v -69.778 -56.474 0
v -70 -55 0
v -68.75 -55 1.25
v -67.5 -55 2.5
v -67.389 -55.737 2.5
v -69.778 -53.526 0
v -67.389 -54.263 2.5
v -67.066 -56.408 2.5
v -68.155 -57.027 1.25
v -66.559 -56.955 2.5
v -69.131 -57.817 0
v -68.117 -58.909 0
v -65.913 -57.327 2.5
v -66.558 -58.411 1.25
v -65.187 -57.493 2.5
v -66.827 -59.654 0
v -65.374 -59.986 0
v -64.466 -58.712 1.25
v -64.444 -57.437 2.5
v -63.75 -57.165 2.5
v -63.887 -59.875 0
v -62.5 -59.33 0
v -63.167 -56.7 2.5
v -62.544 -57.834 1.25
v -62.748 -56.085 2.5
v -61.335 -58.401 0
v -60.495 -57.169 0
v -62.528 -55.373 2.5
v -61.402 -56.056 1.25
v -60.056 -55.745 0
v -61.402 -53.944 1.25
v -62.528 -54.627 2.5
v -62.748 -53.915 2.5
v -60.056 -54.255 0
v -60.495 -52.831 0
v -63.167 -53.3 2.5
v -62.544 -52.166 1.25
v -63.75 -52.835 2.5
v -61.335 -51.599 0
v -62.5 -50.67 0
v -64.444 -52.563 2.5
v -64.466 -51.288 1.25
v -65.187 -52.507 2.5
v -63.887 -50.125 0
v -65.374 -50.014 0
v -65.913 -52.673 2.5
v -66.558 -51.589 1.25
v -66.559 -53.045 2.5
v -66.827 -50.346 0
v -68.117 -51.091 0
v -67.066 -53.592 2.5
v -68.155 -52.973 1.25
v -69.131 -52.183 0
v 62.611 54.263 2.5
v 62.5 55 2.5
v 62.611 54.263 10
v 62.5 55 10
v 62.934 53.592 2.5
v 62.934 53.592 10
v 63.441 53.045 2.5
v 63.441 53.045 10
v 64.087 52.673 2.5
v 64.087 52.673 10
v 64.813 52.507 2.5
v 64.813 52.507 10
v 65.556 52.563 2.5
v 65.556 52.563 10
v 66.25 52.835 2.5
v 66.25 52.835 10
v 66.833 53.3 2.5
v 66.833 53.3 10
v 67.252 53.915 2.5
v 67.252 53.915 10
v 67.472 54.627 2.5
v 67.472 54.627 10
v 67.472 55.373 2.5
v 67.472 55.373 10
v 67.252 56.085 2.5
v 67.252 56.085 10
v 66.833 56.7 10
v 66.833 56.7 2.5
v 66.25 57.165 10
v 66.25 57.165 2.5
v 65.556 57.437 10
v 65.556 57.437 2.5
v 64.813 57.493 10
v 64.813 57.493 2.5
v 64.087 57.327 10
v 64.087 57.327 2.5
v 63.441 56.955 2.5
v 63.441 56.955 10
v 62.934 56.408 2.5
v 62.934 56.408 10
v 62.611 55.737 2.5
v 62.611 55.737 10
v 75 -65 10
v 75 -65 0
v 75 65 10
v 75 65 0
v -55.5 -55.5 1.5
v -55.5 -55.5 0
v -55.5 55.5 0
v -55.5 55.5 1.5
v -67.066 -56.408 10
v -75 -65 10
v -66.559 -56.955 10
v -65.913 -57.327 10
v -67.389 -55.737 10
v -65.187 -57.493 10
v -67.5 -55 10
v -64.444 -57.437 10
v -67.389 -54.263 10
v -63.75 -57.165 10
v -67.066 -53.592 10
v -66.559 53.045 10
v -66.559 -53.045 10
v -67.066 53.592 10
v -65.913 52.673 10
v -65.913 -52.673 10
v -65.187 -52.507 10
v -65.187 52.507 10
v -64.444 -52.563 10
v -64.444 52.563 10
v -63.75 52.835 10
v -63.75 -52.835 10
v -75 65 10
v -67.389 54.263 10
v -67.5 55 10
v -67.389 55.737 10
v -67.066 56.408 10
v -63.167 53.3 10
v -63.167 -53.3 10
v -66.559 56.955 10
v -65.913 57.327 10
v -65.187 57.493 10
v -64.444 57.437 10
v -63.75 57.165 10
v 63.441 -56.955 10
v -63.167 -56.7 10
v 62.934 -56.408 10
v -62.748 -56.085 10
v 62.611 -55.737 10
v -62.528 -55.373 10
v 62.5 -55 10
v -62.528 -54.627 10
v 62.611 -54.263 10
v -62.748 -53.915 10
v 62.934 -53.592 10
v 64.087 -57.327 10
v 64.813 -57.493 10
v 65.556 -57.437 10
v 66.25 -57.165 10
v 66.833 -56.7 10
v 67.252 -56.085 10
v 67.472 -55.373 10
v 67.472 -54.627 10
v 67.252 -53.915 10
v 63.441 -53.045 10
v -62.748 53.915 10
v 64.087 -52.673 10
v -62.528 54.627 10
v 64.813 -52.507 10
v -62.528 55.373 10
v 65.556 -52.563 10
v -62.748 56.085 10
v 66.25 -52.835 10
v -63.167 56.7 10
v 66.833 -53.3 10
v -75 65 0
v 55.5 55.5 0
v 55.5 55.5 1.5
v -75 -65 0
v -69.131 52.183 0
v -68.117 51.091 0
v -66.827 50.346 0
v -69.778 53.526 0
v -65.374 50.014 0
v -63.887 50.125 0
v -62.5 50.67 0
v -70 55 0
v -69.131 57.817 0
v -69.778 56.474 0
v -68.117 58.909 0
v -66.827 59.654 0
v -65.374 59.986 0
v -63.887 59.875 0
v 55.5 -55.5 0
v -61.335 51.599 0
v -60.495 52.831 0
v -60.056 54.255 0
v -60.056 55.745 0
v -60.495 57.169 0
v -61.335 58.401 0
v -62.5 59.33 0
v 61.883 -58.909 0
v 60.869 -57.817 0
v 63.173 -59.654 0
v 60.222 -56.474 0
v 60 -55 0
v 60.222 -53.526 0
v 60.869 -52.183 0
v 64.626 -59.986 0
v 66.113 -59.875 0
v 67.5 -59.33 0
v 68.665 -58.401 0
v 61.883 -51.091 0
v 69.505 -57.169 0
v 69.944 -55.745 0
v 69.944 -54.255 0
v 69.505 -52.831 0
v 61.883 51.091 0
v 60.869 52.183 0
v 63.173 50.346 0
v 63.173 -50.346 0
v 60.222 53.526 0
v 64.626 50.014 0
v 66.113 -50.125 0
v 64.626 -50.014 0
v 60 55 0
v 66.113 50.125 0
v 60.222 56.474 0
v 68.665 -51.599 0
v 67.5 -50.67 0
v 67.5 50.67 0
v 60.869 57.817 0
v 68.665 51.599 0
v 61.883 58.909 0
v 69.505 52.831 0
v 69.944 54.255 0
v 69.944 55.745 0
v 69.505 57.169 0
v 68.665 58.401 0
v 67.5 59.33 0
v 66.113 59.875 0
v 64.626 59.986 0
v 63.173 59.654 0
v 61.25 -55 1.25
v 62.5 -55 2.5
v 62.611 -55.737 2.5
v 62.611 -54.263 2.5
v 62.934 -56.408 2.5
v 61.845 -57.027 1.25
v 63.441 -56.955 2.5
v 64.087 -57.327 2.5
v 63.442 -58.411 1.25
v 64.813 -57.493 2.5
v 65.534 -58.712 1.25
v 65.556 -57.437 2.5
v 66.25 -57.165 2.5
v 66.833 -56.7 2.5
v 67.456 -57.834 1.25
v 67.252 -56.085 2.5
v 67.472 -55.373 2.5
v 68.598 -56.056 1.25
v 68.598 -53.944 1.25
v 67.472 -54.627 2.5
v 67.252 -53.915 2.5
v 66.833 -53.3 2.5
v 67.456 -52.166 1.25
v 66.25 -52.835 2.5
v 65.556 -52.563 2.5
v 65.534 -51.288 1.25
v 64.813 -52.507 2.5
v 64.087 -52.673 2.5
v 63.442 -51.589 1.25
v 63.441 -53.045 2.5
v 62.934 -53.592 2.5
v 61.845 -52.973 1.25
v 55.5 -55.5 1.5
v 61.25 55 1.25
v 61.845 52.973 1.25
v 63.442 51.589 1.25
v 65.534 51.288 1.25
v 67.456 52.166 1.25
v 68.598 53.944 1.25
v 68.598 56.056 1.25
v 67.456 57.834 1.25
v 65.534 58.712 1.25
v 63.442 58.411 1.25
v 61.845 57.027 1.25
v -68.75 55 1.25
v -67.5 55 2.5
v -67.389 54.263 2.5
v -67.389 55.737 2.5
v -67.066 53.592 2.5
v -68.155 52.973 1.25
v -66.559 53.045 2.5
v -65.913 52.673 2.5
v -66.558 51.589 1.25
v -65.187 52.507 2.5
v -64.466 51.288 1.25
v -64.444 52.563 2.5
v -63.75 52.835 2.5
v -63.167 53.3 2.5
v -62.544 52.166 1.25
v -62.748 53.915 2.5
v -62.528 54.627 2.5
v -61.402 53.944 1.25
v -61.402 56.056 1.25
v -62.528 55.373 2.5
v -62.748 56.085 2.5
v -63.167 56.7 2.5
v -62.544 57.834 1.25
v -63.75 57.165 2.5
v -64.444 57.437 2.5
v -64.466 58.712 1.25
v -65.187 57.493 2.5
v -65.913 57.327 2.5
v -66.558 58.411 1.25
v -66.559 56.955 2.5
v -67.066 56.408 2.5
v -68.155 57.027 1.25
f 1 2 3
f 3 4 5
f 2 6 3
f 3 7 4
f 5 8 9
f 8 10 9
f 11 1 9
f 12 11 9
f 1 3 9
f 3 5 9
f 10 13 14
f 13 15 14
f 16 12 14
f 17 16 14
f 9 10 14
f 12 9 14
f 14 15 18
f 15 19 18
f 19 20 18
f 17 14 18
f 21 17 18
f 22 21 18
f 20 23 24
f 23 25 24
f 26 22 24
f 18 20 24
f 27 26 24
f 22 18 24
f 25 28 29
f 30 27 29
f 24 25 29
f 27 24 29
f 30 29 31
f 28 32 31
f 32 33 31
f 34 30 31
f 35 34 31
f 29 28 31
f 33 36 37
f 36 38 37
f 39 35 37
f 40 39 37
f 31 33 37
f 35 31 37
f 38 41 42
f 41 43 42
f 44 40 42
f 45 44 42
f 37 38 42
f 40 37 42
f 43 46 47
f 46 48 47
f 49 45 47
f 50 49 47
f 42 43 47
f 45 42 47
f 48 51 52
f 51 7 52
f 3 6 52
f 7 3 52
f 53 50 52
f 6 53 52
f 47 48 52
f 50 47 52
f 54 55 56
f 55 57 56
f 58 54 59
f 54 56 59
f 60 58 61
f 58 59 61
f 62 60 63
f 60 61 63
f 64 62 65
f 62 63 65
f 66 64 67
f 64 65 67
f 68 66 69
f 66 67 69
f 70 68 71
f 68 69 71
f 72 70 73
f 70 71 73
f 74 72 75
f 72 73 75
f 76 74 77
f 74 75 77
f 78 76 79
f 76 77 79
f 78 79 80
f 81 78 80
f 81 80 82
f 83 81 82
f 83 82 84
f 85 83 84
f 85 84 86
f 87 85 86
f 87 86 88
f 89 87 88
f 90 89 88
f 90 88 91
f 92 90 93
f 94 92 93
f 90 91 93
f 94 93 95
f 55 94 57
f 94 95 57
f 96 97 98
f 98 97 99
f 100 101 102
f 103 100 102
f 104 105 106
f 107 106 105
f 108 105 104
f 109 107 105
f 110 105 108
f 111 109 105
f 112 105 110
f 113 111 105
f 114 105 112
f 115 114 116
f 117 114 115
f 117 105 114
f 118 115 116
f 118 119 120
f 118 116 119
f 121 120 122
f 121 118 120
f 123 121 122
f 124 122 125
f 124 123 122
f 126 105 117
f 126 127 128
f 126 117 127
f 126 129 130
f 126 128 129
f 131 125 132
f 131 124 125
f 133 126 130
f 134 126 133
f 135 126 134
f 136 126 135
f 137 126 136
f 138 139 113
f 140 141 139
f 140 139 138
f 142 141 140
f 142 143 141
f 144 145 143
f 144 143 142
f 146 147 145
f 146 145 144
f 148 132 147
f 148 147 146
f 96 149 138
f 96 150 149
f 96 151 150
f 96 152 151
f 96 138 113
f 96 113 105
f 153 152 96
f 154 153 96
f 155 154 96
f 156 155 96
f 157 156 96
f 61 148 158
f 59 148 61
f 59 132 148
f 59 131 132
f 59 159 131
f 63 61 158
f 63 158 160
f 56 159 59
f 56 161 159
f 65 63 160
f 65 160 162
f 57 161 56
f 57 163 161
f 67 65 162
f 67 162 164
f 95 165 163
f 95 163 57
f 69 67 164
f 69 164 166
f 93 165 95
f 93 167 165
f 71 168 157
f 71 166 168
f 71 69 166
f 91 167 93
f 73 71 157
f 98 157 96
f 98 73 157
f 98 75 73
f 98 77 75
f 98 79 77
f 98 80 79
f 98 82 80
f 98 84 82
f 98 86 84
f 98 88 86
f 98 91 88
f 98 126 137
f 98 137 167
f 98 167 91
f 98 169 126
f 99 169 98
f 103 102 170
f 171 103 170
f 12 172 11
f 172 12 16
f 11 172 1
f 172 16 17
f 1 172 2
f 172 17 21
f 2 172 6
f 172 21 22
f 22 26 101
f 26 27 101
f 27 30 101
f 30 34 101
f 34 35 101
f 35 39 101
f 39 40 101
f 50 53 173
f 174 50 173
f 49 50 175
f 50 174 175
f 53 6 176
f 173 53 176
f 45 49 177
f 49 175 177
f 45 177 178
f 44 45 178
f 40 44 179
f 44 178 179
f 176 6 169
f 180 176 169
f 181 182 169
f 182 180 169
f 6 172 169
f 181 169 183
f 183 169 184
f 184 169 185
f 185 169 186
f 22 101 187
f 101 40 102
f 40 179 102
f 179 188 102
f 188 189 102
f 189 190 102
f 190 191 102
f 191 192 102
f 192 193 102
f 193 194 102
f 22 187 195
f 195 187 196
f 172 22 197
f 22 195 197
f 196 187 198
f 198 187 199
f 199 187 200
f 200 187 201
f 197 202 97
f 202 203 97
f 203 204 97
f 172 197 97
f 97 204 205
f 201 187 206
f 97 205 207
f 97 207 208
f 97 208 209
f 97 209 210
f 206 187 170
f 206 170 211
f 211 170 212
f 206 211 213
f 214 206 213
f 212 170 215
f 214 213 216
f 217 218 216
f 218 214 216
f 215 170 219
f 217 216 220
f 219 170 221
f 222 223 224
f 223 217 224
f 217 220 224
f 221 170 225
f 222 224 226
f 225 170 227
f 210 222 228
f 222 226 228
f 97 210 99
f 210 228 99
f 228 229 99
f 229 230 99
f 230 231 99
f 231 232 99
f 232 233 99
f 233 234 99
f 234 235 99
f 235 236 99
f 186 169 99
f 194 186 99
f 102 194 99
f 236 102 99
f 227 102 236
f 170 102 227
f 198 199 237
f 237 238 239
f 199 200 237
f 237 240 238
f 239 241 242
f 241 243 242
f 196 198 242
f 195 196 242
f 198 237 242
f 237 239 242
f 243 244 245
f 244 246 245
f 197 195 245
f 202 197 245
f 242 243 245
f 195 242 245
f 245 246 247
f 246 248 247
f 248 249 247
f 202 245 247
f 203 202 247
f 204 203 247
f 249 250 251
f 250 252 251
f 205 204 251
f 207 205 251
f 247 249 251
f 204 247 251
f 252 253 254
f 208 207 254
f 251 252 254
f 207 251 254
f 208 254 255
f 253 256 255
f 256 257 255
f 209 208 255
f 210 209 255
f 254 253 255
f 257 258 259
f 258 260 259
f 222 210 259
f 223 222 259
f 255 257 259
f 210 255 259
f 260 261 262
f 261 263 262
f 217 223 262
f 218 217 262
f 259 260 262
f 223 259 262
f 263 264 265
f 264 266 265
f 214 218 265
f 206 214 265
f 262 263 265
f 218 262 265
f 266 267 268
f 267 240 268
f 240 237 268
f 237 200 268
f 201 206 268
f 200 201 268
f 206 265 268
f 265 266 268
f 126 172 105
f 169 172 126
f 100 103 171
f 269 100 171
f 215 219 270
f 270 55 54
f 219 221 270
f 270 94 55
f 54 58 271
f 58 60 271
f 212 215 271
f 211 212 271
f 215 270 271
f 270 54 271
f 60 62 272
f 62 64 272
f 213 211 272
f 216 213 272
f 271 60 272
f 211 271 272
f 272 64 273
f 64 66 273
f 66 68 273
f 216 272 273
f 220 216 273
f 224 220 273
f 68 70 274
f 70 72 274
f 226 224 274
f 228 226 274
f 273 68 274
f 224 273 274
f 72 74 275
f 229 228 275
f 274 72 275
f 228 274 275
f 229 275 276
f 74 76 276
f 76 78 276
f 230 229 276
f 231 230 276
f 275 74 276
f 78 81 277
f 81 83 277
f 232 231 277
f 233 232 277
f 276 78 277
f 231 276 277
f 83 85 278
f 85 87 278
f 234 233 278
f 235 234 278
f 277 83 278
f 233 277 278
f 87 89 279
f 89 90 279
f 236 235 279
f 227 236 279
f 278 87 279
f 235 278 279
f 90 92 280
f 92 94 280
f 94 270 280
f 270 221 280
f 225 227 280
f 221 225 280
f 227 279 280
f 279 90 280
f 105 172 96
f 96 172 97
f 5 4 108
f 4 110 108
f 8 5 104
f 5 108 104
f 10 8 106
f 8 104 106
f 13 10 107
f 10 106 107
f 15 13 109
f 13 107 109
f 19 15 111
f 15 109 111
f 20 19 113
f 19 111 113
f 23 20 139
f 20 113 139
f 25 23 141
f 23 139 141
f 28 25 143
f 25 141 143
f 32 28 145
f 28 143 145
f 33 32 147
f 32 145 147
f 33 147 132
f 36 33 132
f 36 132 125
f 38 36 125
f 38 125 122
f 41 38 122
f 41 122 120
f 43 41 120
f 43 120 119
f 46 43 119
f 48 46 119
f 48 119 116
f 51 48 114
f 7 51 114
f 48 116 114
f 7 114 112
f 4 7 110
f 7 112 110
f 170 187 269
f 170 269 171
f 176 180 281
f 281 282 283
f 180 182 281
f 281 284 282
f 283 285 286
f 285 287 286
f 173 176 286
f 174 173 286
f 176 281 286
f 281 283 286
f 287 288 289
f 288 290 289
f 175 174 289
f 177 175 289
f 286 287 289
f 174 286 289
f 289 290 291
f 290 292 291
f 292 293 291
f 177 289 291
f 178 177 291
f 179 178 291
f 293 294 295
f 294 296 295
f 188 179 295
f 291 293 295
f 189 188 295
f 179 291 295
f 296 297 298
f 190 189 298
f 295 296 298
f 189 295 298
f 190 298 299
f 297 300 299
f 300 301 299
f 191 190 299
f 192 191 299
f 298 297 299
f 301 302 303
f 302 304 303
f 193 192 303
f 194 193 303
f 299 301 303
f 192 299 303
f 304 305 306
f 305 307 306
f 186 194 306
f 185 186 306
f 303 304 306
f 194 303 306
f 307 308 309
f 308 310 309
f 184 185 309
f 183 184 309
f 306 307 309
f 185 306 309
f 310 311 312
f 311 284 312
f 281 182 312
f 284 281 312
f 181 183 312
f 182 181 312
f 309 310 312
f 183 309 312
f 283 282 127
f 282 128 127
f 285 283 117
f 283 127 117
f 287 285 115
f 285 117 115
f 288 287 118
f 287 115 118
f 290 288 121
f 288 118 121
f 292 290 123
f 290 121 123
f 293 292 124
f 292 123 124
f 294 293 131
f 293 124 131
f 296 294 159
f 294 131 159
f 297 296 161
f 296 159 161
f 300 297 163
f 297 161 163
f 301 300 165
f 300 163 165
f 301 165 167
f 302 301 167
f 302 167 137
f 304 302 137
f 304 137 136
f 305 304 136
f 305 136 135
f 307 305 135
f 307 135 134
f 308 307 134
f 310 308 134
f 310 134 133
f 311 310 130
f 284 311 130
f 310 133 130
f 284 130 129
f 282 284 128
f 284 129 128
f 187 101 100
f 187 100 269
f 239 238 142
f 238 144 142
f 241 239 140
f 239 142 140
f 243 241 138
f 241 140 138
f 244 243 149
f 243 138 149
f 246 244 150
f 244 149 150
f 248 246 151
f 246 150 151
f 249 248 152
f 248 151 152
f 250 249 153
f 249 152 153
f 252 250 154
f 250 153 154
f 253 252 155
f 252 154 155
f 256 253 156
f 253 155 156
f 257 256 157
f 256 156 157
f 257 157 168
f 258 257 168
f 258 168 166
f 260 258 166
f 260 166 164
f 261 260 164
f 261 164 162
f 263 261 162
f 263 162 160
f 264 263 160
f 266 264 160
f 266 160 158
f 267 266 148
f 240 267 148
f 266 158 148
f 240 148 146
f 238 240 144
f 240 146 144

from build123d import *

# Parameters (mm, degrees)
SKETCH_W         = 150
SKETCH_H         = 130
SKETCH_W_2       = 111
SKETCH_H_2       = 111
PAD_DEPTH        = 1.5
SKETCH001_W      = 150
SKETCH001_H      = 130
PAD001_DEPTH     = 8.5
HOLE_D           = 5
HOLE_DEPTH       = 25
HOLE_CSINK_D     = 10
HOLE_CSINK_ANGLE = 90


with BuildPart() as part:
    # Sketch → Pad (new body)
    with BuildSketch(Plane.XY):
        Rectangle(SKETCH_W, SKETCH_H)
        Rectangle(SKETCH_W_2, SKETCH_H_2, mode=Mode.SUBTRACT)
    extrude(amount=PAD_DEPTH)

    # Sketch001 (on Face10 of Pad) → Pad001 (join)
    with BuildSketch(Plane.XY.offset(1.5)):
        Rectangle(SKETCH001_W, SKETCH001_H)
    extrude(amount=PAD001_DEPTH)

    # Hole
    with Locations(Plane(origin=(0, 0, 0), x_dir=(1, 0, 0), z_dir=(0, 0, -1))):
        with Locations((-65, 55), (65, 55), (65, -55), (-65, -55)):
            CounterSinkHole(HOLE_D / 2, HOLE_CSINK_D / 2, depth=HOLE_DEPTH, counter_sink_angle=HOLE_CSINK_ANGLE)


solid = part.part
